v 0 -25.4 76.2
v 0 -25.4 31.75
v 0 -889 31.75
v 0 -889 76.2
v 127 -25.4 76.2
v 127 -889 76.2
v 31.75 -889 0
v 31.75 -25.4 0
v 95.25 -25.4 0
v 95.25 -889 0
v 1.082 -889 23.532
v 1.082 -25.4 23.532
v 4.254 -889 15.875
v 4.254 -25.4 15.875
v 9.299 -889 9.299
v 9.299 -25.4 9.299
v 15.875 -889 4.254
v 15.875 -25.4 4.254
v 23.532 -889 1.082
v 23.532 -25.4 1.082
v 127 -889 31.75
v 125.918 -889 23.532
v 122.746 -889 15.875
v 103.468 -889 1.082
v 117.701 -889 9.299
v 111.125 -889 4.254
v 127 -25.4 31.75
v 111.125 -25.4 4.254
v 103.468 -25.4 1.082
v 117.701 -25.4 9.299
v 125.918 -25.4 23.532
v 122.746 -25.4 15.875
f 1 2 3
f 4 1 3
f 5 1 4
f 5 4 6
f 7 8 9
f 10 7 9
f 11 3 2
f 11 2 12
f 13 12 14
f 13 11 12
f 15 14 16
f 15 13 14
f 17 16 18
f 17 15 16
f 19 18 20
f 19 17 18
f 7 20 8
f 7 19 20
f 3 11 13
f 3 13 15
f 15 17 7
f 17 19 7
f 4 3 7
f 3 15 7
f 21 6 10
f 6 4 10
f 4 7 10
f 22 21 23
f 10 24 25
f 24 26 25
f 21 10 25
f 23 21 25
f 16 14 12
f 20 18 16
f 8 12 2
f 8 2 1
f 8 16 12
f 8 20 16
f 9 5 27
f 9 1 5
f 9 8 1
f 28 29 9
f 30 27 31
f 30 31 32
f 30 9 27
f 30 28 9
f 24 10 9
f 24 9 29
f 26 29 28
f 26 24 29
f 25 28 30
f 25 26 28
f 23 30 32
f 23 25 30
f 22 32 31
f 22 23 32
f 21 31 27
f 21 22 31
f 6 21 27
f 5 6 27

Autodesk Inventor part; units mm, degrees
ref_plane "YZ Plane" through (0, 0, 0) normal (1, 0, 0) x (0, 1, 0)
ref_plane "XZ Plane" through (0, 0, 0) normal (0, 1, 0) x (-1, 0, 0)
ref_plane "XY Plane" through (0, 0, 0) normal (0, 0, 1) x (1, 0, 0)
sketch "Sketch1" plane through (0, 0, 0) normal (0, 0, 1) x (1, 0, 0)
  line L0 (0, 0) -> (127, 0)
  line L1 (127, 0) -> (127, 76.2)
  line L2 (127, 76.2) -> (0, 76.2)
  line L3 (0, 76.2) -> (0, 0)
  line L4 (127, 76.2) -> (0, 76.2)
  line L5 (0, 76.2) -> (0, -889)
  line L6 (0, -889) -> (127, -889)
  line L7 (127, -889) -> (127, 76.2)
  dimension "d0" = 127
  dimension "d1" = 76.2
  dimension "d2" = 127
  dimension "d3" = 965.2
extrude "Extrusion1" add sketch "Sketch1" along normal blind 76.2
fillet "Fillet1" radius 31.75 2 edges at (127, -406.4, 0) (0, -406.4, 0)
sketch "Sketch2" plane through (0, 76.2, 76.2) normal (0, 1, 0) x (1, 0, 0)
  arc A0 (31.75, 76.2) -> (0, 44.45) centre (31.75, 44.45) ccw projected
  line L0 (0, 44.45) -> (0, 0) projected
  line L1 (127, 0) -> (0, 0) projected
  line L2 (127, 44.45) -> (127, 0) projected
  arc A1 (127, 44.45) -> (95.25, 76.2) centre (95.25, 44.45) ccw projected
  line L3 (95.25, 76.2) -> (31.75, 76.2) projected
  point P0 (0, 76.2)
extrude "Extrusion2" cut sketch "Sketch2" against normal blind 101.6
properties part number "BumperSide"
